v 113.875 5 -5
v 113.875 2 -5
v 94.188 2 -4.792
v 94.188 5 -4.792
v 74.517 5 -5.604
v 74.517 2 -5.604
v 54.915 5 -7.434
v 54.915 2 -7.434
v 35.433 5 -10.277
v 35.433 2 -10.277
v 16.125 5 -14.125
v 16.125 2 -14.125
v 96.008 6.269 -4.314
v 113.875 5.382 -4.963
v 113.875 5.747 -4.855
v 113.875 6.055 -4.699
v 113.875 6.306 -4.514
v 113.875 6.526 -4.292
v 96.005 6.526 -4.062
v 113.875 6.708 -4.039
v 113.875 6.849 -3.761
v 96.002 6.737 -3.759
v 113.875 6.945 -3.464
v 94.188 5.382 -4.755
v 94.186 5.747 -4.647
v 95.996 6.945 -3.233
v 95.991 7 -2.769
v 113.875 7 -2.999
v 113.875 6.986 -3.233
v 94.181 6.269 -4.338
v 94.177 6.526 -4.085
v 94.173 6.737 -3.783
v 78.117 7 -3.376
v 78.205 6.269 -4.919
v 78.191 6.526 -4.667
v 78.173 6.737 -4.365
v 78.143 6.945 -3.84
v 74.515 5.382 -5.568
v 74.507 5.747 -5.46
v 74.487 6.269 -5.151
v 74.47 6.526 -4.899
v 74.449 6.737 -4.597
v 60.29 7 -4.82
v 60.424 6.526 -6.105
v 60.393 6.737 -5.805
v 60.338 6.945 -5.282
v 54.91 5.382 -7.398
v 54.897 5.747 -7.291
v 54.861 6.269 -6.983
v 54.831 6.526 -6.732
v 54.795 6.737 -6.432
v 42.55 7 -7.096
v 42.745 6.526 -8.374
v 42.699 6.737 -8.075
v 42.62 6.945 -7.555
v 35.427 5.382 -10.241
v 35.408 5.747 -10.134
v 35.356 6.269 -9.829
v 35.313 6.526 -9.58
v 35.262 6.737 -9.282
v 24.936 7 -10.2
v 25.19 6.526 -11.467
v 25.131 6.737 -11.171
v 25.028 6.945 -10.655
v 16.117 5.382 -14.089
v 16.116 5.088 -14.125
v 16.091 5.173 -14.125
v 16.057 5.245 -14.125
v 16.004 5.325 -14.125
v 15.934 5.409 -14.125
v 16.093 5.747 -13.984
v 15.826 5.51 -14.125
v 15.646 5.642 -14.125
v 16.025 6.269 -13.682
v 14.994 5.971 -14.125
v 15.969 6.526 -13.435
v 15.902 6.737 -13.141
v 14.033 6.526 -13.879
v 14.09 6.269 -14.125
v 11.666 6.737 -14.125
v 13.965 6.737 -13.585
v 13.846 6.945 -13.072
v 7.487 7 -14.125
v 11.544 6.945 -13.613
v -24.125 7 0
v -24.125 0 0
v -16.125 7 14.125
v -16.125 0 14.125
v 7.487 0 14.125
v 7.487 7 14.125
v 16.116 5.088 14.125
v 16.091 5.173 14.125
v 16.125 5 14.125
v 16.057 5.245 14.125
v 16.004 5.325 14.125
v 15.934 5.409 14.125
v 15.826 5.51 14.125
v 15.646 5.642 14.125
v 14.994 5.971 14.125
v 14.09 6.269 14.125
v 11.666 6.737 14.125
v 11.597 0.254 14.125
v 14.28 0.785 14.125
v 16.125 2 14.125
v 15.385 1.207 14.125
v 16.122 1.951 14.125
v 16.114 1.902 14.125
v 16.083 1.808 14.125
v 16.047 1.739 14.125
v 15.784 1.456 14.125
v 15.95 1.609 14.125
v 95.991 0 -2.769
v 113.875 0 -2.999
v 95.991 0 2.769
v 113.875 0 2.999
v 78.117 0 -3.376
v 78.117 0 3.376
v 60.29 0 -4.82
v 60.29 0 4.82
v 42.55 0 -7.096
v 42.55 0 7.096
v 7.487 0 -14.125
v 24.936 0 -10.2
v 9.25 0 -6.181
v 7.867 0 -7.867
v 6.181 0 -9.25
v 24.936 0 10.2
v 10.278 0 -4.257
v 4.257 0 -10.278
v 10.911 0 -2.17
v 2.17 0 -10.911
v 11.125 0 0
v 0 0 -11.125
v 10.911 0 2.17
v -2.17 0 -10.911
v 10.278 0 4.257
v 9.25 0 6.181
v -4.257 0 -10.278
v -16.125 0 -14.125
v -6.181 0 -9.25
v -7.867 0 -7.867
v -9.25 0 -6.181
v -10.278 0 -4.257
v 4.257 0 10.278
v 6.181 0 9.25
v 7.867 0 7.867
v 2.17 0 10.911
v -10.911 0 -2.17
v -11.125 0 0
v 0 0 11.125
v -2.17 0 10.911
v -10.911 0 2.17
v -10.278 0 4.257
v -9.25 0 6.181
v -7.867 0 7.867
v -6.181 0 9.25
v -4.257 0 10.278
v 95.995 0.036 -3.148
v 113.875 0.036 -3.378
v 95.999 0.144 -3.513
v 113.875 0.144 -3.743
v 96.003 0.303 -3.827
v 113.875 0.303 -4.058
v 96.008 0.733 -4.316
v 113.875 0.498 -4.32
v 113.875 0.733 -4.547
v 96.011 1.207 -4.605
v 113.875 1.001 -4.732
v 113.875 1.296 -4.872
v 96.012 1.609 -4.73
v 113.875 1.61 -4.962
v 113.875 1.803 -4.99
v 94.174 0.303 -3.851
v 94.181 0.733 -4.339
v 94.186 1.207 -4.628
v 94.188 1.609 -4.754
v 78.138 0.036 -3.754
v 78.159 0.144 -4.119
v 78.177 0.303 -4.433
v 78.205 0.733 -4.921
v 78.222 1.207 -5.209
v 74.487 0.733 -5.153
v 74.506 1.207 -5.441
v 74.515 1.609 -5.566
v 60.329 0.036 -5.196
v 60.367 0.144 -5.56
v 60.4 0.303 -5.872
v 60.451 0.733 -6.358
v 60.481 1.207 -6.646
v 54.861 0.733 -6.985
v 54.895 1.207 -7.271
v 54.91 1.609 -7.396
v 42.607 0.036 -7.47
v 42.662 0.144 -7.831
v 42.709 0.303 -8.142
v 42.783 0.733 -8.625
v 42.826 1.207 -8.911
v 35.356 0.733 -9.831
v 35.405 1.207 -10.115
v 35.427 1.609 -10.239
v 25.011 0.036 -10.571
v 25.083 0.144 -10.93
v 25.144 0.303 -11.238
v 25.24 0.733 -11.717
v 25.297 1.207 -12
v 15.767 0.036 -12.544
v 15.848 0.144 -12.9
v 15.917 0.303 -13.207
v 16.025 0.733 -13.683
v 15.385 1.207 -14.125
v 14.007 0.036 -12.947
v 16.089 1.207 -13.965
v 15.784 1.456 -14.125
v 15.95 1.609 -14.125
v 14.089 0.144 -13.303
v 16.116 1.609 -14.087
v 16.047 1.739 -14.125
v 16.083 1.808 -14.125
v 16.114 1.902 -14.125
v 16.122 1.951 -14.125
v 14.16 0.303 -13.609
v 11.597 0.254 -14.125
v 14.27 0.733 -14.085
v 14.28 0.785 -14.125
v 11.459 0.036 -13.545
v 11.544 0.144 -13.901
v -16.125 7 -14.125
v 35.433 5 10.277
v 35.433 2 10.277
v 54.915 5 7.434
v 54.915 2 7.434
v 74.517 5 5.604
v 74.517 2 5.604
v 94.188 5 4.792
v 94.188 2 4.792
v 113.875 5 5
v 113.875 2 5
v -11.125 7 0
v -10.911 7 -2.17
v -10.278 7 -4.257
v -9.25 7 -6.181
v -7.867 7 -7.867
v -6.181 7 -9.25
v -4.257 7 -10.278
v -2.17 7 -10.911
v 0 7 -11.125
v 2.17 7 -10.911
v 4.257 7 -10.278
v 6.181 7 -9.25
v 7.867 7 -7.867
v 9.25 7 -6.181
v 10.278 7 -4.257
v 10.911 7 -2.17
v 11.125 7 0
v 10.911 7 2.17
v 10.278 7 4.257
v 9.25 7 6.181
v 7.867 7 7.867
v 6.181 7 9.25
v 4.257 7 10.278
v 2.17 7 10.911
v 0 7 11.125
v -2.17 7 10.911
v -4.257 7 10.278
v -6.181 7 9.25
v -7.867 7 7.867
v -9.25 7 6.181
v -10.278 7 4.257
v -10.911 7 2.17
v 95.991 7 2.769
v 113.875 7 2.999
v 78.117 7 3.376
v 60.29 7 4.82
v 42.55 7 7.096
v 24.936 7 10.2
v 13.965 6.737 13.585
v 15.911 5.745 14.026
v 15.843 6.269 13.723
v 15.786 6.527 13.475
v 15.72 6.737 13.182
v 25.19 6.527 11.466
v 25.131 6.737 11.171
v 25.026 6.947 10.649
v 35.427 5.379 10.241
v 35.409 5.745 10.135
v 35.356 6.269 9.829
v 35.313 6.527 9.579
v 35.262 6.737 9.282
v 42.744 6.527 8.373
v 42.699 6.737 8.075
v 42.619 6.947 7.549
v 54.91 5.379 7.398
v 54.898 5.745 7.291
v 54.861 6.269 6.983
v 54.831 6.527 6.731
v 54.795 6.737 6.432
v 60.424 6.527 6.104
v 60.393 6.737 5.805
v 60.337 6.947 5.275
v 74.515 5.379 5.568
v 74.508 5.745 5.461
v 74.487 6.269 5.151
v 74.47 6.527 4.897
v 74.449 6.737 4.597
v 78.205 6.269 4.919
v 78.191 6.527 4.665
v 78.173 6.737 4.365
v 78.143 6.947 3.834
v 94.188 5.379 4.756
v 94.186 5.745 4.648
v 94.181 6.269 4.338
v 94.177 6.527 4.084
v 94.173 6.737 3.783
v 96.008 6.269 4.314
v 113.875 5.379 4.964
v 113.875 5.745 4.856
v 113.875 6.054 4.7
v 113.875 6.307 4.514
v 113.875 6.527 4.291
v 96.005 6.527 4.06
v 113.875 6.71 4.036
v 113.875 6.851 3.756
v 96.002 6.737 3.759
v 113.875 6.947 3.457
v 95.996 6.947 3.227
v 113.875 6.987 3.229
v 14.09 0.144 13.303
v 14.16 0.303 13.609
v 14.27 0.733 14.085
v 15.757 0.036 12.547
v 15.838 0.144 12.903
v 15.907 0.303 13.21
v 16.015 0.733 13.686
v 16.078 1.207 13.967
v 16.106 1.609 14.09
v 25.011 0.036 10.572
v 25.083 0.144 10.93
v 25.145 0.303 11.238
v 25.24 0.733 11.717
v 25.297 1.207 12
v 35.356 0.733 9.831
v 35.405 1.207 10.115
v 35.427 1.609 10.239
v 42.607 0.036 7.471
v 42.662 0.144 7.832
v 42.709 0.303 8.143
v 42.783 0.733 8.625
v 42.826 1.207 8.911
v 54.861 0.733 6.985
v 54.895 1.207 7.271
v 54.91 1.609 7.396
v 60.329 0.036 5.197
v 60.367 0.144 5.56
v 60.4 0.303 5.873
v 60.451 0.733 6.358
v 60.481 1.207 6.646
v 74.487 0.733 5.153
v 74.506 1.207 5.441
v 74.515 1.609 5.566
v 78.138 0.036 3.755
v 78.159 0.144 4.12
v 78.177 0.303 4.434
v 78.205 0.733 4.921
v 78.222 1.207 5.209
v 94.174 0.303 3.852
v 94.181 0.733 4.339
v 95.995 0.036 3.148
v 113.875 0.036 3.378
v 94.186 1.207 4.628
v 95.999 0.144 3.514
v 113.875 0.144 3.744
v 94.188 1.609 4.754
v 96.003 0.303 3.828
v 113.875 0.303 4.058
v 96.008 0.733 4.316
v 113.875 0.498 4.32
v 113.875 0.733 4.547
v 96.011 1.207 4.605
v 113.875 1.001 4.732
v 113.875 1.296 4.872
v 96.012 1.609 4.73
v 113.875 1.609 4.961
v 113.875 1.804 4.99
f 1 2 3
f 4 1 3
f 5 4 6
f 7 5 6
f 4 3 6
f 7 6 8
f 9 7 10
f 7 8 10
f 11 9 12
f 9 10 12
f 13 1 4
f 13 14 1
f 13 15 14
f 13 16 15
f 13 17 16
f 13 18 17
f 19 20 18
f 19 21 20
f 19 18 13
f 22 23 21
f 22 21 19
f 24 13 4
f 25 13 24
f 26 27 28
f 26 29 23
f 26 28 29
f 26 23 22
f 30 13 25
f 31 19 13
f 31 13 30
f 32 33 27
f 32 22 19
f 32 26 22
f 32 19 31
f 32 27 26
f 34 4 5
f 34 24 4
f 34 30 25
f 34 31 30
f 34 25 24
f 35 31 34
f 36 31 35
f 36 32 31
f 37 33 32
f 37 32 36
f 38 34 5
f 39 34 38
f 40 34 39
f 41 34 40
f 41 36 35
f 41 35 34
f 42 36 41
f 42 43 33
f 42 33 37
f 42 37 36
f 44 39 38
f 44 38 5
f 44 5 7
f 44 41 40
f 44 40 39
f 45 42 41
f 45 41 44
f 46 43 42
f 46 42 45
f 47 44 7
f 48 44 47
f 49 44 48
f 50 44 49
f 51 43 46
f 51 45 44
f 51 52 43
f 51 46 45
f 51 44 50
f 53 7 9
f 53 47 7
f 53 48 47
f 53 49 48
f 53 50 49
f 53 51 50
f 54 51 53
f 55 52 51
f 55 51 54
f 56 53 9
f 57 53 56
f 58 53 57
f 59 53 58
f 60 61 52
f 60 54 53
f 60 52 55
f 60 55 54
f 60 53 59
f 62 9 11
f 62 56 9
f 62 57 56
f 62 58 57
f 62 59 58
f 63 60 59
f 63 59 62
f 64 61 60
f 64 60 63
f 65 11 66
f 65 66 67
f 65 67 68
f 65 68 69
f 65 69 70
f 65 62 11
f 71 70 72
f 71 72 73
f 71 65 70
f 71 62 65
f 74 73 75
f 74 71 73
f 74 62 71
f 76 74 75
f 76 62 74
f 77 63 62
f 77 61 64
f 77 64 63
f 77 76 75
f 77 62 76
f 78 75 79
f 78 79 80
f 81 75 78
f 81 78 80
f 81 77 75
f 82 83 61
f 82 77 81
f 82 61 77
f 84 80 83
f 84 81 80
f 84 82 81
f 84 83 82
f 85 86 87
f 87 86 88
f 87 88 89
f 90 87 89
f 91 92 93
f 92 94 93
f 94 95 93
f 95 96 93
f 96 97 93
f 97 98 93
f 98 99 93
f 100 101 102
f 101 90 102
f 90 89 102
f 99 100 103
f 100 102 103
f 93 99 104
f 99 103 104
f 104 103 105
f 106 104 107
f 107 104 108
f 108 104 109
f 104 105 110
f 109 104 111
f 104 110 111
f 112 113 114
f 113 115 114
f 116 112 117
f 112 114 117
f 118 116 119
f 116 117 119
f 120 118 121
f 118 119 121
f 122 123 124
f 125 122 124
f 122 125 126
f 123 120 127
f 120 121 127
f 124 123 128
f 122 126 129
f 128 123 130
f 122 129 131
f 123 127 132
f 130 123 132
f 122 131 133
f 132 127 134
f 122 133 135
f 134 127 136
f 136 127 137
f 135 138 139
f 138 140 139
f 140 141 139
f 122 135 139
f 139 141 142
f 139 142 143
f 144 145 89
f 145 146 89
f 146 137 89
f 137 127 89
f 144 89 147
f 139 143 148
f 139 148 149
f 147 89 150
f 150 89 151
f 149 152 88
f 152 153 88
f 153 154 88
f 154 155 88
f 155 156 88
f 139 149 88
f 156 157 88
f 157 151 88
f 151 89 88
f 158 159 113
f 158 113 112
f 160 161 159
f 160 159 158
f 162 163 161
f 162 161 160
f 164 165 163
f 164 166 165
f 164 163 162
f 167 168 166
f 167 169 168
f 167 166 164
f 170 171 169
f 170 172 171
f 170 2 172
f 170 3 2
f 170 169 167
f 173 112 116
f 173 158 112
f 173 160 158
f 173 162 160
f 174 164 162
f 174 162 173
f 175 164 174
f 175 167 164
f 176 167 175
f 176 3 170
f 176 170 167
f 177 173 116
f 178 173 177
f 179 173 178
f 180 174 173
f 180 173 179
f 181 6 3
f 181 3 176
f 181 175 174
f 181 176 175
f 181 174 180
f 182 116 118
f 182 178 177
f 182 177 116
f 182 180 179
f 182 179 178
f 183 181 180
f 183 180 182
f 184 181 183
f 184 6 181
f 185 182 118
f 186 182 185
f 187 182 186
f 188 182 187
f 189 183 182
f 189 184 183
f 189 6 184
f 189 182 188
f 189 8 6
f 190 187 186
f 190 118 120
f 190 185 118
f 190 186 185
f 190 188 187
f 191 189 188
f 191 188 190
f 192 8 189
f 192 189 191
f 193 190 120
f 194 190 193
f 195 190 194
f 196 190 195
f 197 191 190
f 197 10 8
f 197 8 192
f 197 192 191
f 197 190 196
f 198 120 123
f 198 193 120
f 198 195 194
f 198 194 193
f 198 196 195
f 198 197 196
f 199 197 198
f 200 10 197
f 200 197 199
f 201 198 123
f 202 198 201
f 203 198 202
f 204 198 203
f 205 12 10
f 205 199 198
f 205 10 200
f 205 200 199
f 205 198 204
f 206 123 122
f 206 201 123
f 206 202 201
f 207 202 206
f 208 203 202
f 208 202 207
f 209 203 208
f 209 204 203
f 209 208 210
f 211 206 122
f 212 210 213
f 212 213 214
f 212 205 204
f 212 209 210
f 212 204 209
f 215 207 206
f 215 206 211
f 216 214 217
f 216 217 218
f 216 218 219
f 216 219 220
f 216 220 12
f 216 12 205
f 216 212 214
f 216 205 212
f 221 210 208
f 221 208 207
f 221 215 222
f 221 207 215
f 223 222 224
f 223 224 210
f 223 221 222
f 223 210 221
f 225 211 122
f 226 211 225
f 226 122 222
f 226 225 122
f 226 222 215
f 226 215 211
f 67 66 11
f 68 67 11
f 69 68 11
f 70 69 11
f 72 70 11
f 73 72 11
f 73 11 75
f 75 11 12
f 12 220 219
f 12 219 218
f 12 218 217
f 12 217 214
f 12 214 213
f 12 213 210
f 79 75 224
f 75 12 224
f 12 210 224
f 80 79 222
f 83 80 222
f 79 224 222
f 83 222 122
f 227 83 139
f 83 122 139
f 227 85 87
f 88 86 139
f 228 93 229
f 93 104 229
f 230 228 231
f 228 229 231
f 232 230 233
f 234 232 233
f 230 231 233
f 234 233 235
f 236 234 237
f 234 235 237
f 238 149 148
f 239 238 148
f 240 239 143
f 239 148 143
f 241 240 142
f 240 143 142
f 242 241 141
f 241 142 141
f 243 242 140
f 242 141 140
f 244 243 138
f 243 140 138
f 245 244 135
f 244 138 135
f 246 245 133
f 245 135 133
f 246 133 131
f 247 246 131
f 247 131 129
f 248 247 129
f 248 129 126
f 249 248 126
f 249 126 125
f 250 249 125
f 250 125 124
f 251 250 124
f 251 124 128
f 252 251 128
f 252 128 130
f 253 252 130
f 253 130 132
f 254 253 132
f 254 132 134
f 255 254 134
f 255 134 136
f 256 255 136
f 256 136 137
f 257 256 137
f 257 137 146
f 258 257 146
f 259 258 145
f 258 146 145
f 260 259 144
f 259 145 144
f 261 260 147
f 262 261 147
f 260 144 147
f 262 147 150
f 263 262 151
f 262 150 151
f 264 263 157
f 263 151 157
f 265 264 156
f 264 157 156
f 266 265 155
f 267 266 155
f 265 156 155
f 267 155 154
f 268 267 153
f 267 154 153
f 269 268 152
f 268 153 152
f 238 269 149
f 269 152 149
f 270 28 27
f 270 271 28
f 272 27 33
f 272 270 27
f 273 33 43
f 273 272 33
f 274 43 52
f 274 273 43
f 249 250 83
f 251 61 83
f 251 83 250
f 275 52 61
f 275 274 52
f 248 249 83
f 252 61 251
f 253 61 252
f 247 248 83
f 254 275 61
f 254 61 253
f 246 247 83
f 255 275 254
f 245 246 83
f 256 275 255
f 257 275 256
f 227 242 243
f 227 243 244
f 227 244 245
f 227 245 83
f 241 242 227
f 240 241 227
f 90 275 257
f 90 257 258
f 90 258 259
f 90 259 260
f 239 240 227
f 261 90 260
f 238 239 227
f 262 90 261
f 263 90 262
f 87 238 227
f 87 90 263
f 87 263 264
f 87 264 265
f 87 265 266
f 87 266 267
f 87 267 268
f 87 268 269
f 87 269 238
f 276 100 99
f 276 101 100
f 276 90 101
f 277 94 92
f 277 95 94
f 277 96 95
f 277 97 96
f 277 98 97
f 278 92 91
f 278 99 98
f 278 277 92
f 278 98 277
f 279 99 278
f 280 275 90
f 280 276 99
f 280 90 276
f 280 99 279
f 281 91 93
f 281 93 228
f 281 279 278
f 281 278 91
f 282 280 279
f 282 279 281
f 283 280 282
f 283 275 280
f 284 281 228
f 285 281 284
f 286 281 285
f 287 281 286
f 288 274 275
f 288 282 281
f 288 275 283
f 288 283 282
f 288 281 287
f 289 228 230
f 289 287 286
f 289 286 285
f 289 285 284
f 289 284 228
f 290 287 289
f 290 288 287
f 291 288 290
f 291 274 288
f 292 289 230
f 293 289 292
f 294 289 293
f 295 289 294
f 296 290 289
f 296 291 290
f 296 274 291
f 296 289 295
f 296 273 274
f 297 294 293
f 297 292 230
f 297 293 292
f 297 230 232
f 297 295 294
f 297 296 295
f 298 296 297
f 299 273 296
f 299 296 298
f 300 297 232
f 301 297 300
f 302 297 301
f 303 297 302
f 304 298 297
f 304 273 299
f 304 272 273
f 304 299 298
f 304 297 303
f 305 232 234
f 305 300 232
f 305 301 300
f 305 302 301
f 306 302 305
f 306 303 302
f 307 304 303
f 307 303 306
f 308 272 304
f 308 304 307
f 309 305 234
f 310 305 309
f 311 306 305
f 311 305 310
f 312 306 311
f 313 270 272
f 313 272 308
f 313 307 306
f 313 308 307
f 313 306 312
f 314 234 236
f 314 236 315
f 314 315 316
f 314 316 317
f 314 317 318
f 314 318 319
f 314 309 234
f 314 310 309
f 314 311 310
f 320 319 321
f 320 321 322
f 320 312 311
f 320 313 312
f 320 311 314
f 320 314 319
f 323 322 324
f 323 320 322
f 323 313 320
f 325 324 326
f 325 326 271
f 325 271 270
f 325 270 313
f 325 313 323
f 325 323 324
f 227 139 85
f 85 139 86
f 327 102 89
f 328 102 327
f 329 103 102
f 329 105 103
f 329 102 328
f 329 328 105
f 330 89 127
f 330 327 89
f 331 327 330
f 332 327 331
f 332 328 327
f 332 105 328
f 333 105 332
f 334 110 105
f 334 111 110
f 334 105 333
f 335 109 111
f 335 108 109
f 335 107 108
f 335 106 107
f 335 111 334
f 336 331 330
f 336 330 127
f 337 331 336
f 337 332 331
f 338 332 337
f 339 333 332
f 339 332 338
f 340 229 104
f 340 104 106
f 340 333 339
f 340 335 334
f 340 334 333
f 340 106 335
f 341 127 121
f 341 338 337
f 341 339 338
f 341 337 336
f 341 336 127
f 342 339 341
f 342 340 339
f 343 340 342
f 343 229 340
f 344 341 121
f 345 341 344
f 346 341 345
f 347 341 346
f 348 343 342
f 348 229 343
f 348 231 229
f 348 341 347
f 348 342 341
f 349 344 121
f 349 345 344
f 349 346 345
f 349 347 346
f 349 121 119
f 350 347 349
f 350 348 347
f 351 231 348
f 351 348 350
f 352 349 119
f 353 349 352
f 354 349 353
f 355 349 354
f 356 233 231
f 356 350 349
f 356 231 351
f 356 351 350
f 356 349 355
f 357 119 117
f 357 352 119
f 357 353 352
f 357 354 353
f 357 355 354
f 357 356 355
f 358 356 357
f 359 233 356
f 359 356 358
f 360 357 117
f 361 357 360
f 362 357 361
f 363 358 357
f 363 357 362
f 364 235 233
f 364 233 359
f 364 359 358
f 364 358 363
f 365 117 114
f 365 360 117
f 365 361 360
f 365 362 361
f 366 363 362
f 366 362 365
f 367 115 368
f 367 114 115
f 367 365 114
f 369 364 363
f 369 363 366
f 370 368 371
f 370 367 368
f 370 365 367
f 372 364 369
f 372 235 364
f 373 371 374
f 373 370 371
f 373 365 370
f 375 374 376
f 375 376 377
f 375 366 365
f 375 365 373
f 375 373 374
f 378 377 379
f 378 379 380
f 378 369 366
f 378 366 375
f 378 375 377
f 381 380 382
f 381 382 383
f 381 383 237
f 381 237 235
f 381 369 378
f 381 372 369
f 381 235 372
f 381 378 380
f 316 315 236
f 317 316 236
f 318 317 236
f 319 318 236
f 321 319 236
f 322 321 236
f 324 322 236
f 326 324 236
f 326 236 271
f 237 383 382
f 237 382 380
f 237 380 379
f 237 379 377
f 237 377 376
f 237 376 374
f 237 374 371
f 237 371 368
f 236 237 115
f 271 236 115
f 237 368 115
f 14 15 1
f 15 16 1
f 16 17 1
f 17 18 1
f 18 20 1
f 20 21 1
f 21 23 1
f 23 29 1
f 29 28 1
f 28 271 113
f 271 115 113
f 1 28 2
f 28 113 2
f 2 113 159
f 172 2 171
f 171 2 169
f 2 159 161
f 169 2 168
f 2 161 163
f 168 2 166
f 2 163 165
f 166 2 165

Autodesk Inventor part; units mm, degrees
ref_plane "YZ Plane" through (0, 0, 0) normal (1, 0, 0) x (0, 1, 0)
ref_plane "XZ Plane" through (0, 0, 0) normal (0, 1, 0) x (-1, 0, 0)
ref_plane "XY Plane" through (0, 0, 0) normal (0, 0, 1) x (1, 0, 0)
sketch "Sketch1" plane through (0, 0, 0) normal (0, 1, 0) x (-1, 0, 0)
  circle A0 centre (0, 0) radius 11.125
  line L0 (0, -11.125) -> (0, -14.125)
  line L1 (0, 11.125) -> (0, 14.125)
  line L2 (11.125, 0) -> (16.125, 0)
  line L3 (16.125, 14.125) -> (-113.875, 14.125)
  line L4 (-113.875, 14.125) -> (-113.875, -14.125)
  line L5 (-113.875, -14.125) -> (16.125, -14.125)
  line L6 (16.125, -14.125) -> (16.125, 14.125)
  dimension "d0" = 22.25
  dimension "d1" = 3
  dimension "d2" = 3
  dimension "d3" = 5
  dimension "d6" = 130
extrude "Extrusion1" add sketch "Sketch1" along normal blind 7 contours L2 L6 L5 L0 A0 | A0 L1 L3 L6 L2 | A0 L0 L5 L4 L3 L1
sketch "Sketch2" plane through (0, 0, 0) normal (0, -1, 0) x (1, 0, 0)
  line L0 (113.875, 14.125) -> (113.875, -14.125) projected
  line L1 (113.875, 0) -> (113.875, 5)
  line L2 (113.875, 5) -> (113.875, -5)
  circle A0 centre (0, 0) radius 11.125 projected
  line L3 (11.125, 0) -> (16.125, 0)
  line L4 (-16.125, 14.125) -> (113.875, 14.125) projected
  line L5 (16.125, 14.125) -> (16.125, -14.125)
  line L6 (113.875, -14.125) -> (-16.125, -14.125) projected
  arc A1 (16.125, 14.125) -> (113.875, 5) centre (100.0237, 384.7475) ccw
  arc A2 (113.875, -5) -> (16.125, -14.125) centre (100.0237, -384.7475) ccw
  line L7 (16.125, 14.125) -> (113.875, 14.125)
  line L8 (113.875, 14.125) -> (113.875, 5)
  line L9 (16.125, -14.125) -> (113.875, -14.125)
  line L10 (113.875, -14.125) -> (113.875, -5)
  dimension "d9" = 5
  dimension "d10" = 10
  dimension "d11" = 5
  dimension "d12" = 380
  dimension "d13" = 380
extrude "Extrusion2" cut sketch "Sketch2" against normal through all contours L0 A1 L4 | L0 L6 A2
fillet "Fillet1" radius 2 1 edges at (64.7041, 0, 6.3924)
fillet "Fillet2" radius 2 1 edges at (64.7041, 7, 6.3924)
fillet "Fillet3" radius 2 1 edges at (64.7041, 0, -6.3924)
fillet "Fillet4" radius 2 1 edges at (64.7041, 7, -6.3924)
sketch "Sketch3" plane through (0, 0, 0) normal (0, -1, 0) x (1, 0, 0)
  line L0 (-16.125, -14.125) -> (-16.125, 14.125) projected
  line L1 (-16.125, 0) -> (-24.125, 0)
  line L2 (-24.125, 0) -> (-16.125, 14.125)
  line L3 (-16.125, 14.125) -> (-16.125, -14.125)
  line L4 (-16.125, -14.125) -> (-24.125, 0)
  point P0 (0, 0)
  dimension "d20" = 8
extrude "Extrusion3" add sketch "Sketch3" against normal blind 7
properties part number "Leg"
